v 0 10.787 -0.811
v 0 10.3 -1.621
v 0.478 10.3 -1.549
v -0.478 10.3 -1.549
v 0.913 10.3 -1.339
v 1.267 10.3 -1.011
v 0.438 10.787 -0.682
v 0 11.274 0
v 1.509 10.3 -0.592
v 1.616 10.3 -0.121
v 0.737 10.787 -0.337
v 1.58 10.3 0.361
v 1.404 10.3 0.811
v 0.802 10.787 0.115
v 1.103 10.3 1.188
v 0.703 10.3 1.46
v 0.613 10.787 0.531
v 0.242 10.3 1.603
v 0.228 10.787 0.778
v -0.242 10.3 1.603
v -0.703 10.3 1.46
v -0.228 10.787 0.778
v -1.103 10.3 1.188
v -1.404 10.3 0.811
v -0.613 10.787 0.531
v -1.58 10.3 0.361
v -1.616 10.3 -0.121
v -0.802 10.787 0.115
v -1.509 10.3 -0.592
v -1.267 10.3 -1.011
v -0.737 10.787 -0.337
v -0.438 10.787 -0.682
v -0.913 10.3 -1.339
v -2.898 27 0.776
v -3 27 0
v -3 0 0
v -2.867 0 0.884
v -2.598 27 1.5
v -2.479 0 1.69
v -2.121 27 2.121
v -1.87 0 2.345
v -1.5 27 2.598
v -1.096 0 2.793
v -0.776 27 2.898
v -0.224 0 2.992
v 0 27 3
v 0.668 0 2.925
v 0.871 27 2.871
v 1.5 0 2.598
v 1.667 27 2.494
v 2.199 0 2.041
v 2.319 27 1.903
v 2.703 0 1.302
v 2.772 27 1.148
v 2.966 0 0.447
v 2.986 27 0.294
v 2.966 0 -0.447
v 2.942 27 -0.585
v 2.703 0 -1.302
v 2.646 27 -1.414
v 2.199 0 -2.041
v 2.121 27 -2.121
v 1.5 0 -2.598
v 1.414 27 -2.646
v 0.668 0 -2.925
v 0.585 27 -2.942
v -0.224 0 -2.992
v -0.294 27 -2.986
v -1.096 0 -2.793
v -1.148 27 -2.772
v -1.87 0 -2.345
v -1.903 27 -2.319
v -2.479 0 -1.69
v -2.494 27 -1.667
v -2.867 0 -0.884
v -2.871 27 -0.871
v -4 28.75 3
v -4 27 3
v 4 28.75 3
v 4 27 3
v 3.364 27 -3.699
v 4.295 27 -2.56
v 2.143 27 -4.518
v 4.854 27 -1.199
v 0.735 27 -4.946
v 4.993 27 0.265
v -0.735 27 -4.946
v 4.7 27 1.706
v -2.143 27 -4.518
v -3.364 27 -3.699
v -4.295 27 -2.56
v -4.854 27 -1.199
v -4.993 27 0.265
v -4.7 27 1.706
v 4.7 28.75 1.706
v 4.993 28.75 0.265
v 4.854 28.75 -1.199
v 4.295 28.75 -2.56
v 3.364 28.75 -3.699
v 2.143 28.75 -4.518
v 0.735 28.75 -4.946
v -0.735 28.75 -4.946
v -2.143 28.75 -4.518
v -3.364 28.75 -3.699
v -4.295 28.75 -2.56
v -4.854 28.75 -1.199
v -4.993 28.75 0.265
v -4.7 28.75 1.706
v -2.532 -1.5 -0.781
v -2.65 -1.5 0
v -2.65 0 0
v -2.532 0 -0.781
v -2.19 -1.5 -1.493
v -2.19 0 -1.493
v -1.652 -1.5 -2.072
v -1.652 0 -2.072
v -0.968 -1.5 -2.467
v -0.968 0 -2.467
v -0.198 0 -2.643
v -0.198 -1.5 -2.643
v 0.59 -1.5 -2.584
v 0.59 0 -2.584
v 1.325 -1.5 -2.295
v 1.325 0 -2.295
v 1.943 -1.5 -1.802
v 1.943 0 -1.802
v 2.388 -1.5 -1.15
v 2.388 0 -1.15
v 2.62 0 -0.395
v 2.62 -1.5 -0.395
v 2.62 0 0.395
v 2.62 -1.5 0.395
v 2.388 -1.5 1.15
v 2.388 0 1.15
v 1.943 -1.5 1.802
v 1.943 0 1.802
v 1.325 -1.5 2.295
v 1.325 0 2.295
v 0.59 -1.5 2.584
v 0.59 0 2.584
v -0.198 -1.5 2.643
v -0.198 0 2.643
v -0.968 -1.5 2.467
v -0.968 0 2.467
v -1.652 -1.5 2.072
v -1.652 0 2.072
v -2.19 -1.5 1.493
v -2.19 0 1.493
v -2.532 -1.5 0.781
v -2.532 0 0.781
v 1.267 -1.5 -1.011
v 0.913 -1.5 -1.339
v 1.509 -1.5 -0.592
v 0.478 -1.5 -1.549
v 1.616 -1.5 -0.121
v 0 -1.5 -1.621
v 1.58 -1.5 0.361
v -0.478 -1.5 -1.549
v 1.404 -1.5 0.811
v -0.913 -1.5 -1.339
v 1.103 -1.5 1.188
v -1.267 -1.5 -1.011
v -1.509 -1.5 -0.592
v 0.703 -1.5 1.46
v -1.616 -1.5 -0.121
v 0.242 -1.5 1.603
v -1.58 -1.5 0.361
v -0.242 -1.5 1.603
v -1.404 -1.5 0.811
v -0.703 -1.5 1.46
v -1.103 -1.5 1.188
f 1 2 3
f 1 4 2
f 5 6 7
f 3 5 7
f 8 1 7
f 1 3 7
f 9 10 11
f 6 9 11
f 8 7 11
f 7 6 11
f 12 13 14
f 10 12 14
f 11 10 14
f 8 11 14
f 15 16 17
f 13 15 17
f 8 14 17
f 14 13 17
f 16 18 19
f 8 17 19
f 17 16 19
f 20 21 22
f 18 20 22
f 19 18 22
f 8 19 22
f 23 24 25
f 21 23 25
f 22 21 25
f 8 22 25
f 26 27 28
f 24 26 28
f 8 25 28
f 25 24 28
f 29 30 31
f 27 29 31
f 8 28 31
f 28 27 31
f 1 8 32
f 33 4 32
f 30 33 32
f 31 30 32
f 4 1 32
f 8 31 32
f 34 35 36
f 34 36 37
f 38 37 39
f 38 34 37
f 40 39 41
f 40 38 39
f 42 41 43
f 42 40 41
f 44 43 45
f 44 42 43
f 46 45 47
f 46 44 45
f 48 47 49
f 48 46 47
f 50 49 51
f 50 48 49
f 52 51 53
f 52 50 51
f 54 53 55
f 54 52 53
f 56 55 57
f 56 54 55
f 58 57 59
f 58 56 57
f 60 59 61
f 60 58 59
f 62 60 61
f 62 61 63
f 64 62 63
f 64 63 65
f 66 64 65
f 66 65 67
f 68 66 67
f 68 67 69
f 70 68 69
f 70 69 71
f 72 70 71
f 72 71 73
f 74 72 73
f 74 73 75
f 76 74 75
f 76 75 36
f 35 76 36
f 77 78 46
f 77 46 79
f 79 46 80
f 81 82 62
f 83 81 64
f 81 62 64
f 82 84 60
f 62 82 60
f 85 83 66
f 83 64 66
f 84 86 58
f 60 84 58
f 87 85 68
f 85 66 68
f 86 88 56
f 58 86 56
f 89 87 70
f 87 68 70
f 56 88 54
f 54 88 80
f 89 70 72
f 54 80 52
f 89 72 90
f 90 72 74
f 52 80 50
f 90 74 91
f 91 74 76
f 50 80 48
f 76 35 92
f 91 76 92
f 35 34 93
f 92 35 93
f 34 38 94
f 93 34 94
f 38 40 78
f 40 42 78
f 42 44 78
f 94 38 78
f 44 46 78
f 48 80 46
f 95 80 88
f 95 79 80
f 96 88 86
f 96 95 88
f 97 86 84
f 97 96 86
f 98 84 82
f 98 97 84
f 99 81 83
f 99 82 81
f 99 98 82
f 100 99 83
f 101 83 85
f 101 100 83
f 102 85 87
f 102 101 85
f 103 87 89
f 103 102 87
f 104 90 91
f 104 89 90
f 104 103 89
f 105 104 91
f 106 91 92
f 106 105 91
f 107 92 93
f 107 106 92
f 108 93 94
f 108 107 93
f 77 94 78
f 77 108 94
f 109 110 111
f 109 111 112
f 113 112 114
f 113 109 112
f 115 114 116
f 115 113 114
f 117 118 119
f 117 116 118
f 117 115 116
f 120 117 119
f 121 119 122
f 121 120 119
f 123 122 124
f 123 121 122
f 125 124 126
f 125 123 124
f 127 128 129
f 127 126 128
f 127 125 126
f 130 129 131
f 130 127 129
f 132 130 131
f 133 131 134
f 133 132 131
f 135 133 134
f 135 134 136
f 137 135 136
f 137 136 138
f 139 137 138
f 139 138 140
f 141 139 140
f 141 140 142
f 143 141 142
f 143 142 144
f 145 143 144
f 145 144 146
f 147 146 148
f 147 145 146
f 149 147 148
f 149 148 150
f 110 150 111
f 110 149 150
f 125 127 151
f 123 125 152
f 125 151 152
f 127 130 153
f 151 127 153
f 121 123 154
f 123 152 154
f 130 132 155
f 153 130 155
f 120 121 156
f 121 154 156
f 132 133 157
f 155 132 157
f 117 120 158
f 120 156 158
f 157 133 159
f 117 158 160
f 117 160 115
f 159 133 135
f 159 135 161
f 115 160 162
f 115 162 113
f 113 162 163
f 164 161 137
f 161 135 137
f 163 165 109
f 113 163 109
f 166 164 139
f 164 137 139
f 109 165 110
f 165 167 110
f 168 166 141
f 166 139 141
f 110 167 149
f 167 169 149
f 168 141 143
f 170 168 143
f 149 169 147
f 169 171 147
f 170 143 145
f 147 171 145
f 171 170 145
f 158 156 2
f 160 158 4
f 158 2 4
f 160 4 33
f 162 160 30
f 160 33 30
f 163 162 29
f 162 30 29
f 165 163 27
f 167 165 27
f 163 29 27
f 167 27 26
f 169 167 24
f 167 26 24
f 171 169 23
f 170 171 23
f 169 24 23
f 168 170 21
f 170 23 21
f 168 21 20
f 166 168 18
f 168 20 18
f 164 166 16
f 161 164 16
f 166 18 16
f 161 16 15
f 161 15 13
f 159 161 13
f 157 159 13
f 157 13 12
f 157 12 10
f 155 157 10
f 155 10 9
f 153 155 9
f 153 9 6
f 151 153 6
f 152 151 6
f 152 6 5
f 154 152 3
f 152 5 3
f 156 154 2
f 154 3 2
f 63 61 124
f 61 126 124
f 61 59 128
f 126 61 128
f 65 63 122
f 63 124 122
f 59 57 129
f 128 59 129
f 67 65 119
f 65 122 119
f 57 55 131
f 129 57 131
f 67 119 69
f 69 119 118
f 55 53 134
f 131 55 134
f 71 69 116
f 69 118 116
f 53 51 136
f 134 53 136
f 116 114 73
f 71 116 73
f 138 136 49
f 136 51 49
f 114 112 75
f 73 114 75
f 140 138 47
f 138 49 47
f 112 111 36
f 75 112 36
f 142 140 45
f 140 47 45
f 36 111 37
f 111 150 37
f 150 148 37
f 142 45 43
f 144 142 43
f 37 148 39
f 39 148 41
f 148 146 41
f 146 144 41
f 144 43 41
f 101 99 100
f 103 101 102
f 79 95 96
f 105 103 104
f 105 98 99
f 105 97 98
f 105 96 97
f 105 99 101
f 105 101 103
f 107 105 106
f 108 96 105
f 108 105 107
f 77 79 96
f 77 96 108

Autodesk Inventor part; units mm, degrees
ref_plane "YZ Plane" through (0, 0, 0) normal (1, 0, 0) x (0, 1, 0)
ref_plane "XZ Plane" through (0, 0, 0) normal (0, 1, 0) x (-1, 0, 0)
ref_plane "XY Plane" through (0, 0, 0) normal (0, 0, 1) x (1, 0, 0)
sketch "Sketch1" plane through (0, 0, 0) normal (0, 0, 1) x (1, 0, 0)
  line L0 (0, 0) -> (0, 39.4806) construction
  line L1 (0, 0) -> (-3, 0) construction
  line L2 (-3, 0) -> (-3, 27)
  line L3 (-3, 27) -> (-5, 27)
  line L4 (-5, 27) -> (-5, 28.75)
  line L5 (0, 0) -> (0, 29)
  line L6 (-3, 0) -> (-2.65, 0)
  line L7 (-2.65, -1.5) -> (0, -1.5)
  line L8 (0, -1.5) -> (0, 0)
  line L9 (-2.65, 0) -> (-2.65, -1.5)
  line L10 (-5, 28.75) -> (0, 28.75)
  dimension "d0" = 3
  dimension "d1" = 5
  dimension "d5" = 27
  dimension "d12" = 2.65
  dimension "d13" = 1.5
  dimension "d24" = 1.75
revolve "Revolution1" add sketch "Sketch1" angle 360 about axis through (0, 0, 0) along (0, 1, 0)
sketch "Sketch3" plane through (0, -1.5, 0) normal (0, -1, 0) x (1, 0, 0)
  point P0 (0, 0)
  point P1 (0, 0)
hole "Hole1" at (0, -1.5, 0) direction (0, 1, 0) diameter 3.242 depth 11.8 tip angle 118 thread size "M4x0.7" class "6H" standard "ANSI Metric M Profile"
sketch "Sketch4" plane through (0, 27, 0) normal (0, -1, 0) x (1, 0, 0)
  arc A0 (4, 3) -> (-4, 3) centre (0, 0) ccw
  line L0 (-4, 3) -> (4, 3)
  circle A1 centre (0, 0) radius 3 projected
  circle A2 centre (0, 0) radius 5 projected
extrude "Extrusion2" cut sketch "Sketch4" against normal through all contours L0 A0
properties part number "shim_peg_V3"
